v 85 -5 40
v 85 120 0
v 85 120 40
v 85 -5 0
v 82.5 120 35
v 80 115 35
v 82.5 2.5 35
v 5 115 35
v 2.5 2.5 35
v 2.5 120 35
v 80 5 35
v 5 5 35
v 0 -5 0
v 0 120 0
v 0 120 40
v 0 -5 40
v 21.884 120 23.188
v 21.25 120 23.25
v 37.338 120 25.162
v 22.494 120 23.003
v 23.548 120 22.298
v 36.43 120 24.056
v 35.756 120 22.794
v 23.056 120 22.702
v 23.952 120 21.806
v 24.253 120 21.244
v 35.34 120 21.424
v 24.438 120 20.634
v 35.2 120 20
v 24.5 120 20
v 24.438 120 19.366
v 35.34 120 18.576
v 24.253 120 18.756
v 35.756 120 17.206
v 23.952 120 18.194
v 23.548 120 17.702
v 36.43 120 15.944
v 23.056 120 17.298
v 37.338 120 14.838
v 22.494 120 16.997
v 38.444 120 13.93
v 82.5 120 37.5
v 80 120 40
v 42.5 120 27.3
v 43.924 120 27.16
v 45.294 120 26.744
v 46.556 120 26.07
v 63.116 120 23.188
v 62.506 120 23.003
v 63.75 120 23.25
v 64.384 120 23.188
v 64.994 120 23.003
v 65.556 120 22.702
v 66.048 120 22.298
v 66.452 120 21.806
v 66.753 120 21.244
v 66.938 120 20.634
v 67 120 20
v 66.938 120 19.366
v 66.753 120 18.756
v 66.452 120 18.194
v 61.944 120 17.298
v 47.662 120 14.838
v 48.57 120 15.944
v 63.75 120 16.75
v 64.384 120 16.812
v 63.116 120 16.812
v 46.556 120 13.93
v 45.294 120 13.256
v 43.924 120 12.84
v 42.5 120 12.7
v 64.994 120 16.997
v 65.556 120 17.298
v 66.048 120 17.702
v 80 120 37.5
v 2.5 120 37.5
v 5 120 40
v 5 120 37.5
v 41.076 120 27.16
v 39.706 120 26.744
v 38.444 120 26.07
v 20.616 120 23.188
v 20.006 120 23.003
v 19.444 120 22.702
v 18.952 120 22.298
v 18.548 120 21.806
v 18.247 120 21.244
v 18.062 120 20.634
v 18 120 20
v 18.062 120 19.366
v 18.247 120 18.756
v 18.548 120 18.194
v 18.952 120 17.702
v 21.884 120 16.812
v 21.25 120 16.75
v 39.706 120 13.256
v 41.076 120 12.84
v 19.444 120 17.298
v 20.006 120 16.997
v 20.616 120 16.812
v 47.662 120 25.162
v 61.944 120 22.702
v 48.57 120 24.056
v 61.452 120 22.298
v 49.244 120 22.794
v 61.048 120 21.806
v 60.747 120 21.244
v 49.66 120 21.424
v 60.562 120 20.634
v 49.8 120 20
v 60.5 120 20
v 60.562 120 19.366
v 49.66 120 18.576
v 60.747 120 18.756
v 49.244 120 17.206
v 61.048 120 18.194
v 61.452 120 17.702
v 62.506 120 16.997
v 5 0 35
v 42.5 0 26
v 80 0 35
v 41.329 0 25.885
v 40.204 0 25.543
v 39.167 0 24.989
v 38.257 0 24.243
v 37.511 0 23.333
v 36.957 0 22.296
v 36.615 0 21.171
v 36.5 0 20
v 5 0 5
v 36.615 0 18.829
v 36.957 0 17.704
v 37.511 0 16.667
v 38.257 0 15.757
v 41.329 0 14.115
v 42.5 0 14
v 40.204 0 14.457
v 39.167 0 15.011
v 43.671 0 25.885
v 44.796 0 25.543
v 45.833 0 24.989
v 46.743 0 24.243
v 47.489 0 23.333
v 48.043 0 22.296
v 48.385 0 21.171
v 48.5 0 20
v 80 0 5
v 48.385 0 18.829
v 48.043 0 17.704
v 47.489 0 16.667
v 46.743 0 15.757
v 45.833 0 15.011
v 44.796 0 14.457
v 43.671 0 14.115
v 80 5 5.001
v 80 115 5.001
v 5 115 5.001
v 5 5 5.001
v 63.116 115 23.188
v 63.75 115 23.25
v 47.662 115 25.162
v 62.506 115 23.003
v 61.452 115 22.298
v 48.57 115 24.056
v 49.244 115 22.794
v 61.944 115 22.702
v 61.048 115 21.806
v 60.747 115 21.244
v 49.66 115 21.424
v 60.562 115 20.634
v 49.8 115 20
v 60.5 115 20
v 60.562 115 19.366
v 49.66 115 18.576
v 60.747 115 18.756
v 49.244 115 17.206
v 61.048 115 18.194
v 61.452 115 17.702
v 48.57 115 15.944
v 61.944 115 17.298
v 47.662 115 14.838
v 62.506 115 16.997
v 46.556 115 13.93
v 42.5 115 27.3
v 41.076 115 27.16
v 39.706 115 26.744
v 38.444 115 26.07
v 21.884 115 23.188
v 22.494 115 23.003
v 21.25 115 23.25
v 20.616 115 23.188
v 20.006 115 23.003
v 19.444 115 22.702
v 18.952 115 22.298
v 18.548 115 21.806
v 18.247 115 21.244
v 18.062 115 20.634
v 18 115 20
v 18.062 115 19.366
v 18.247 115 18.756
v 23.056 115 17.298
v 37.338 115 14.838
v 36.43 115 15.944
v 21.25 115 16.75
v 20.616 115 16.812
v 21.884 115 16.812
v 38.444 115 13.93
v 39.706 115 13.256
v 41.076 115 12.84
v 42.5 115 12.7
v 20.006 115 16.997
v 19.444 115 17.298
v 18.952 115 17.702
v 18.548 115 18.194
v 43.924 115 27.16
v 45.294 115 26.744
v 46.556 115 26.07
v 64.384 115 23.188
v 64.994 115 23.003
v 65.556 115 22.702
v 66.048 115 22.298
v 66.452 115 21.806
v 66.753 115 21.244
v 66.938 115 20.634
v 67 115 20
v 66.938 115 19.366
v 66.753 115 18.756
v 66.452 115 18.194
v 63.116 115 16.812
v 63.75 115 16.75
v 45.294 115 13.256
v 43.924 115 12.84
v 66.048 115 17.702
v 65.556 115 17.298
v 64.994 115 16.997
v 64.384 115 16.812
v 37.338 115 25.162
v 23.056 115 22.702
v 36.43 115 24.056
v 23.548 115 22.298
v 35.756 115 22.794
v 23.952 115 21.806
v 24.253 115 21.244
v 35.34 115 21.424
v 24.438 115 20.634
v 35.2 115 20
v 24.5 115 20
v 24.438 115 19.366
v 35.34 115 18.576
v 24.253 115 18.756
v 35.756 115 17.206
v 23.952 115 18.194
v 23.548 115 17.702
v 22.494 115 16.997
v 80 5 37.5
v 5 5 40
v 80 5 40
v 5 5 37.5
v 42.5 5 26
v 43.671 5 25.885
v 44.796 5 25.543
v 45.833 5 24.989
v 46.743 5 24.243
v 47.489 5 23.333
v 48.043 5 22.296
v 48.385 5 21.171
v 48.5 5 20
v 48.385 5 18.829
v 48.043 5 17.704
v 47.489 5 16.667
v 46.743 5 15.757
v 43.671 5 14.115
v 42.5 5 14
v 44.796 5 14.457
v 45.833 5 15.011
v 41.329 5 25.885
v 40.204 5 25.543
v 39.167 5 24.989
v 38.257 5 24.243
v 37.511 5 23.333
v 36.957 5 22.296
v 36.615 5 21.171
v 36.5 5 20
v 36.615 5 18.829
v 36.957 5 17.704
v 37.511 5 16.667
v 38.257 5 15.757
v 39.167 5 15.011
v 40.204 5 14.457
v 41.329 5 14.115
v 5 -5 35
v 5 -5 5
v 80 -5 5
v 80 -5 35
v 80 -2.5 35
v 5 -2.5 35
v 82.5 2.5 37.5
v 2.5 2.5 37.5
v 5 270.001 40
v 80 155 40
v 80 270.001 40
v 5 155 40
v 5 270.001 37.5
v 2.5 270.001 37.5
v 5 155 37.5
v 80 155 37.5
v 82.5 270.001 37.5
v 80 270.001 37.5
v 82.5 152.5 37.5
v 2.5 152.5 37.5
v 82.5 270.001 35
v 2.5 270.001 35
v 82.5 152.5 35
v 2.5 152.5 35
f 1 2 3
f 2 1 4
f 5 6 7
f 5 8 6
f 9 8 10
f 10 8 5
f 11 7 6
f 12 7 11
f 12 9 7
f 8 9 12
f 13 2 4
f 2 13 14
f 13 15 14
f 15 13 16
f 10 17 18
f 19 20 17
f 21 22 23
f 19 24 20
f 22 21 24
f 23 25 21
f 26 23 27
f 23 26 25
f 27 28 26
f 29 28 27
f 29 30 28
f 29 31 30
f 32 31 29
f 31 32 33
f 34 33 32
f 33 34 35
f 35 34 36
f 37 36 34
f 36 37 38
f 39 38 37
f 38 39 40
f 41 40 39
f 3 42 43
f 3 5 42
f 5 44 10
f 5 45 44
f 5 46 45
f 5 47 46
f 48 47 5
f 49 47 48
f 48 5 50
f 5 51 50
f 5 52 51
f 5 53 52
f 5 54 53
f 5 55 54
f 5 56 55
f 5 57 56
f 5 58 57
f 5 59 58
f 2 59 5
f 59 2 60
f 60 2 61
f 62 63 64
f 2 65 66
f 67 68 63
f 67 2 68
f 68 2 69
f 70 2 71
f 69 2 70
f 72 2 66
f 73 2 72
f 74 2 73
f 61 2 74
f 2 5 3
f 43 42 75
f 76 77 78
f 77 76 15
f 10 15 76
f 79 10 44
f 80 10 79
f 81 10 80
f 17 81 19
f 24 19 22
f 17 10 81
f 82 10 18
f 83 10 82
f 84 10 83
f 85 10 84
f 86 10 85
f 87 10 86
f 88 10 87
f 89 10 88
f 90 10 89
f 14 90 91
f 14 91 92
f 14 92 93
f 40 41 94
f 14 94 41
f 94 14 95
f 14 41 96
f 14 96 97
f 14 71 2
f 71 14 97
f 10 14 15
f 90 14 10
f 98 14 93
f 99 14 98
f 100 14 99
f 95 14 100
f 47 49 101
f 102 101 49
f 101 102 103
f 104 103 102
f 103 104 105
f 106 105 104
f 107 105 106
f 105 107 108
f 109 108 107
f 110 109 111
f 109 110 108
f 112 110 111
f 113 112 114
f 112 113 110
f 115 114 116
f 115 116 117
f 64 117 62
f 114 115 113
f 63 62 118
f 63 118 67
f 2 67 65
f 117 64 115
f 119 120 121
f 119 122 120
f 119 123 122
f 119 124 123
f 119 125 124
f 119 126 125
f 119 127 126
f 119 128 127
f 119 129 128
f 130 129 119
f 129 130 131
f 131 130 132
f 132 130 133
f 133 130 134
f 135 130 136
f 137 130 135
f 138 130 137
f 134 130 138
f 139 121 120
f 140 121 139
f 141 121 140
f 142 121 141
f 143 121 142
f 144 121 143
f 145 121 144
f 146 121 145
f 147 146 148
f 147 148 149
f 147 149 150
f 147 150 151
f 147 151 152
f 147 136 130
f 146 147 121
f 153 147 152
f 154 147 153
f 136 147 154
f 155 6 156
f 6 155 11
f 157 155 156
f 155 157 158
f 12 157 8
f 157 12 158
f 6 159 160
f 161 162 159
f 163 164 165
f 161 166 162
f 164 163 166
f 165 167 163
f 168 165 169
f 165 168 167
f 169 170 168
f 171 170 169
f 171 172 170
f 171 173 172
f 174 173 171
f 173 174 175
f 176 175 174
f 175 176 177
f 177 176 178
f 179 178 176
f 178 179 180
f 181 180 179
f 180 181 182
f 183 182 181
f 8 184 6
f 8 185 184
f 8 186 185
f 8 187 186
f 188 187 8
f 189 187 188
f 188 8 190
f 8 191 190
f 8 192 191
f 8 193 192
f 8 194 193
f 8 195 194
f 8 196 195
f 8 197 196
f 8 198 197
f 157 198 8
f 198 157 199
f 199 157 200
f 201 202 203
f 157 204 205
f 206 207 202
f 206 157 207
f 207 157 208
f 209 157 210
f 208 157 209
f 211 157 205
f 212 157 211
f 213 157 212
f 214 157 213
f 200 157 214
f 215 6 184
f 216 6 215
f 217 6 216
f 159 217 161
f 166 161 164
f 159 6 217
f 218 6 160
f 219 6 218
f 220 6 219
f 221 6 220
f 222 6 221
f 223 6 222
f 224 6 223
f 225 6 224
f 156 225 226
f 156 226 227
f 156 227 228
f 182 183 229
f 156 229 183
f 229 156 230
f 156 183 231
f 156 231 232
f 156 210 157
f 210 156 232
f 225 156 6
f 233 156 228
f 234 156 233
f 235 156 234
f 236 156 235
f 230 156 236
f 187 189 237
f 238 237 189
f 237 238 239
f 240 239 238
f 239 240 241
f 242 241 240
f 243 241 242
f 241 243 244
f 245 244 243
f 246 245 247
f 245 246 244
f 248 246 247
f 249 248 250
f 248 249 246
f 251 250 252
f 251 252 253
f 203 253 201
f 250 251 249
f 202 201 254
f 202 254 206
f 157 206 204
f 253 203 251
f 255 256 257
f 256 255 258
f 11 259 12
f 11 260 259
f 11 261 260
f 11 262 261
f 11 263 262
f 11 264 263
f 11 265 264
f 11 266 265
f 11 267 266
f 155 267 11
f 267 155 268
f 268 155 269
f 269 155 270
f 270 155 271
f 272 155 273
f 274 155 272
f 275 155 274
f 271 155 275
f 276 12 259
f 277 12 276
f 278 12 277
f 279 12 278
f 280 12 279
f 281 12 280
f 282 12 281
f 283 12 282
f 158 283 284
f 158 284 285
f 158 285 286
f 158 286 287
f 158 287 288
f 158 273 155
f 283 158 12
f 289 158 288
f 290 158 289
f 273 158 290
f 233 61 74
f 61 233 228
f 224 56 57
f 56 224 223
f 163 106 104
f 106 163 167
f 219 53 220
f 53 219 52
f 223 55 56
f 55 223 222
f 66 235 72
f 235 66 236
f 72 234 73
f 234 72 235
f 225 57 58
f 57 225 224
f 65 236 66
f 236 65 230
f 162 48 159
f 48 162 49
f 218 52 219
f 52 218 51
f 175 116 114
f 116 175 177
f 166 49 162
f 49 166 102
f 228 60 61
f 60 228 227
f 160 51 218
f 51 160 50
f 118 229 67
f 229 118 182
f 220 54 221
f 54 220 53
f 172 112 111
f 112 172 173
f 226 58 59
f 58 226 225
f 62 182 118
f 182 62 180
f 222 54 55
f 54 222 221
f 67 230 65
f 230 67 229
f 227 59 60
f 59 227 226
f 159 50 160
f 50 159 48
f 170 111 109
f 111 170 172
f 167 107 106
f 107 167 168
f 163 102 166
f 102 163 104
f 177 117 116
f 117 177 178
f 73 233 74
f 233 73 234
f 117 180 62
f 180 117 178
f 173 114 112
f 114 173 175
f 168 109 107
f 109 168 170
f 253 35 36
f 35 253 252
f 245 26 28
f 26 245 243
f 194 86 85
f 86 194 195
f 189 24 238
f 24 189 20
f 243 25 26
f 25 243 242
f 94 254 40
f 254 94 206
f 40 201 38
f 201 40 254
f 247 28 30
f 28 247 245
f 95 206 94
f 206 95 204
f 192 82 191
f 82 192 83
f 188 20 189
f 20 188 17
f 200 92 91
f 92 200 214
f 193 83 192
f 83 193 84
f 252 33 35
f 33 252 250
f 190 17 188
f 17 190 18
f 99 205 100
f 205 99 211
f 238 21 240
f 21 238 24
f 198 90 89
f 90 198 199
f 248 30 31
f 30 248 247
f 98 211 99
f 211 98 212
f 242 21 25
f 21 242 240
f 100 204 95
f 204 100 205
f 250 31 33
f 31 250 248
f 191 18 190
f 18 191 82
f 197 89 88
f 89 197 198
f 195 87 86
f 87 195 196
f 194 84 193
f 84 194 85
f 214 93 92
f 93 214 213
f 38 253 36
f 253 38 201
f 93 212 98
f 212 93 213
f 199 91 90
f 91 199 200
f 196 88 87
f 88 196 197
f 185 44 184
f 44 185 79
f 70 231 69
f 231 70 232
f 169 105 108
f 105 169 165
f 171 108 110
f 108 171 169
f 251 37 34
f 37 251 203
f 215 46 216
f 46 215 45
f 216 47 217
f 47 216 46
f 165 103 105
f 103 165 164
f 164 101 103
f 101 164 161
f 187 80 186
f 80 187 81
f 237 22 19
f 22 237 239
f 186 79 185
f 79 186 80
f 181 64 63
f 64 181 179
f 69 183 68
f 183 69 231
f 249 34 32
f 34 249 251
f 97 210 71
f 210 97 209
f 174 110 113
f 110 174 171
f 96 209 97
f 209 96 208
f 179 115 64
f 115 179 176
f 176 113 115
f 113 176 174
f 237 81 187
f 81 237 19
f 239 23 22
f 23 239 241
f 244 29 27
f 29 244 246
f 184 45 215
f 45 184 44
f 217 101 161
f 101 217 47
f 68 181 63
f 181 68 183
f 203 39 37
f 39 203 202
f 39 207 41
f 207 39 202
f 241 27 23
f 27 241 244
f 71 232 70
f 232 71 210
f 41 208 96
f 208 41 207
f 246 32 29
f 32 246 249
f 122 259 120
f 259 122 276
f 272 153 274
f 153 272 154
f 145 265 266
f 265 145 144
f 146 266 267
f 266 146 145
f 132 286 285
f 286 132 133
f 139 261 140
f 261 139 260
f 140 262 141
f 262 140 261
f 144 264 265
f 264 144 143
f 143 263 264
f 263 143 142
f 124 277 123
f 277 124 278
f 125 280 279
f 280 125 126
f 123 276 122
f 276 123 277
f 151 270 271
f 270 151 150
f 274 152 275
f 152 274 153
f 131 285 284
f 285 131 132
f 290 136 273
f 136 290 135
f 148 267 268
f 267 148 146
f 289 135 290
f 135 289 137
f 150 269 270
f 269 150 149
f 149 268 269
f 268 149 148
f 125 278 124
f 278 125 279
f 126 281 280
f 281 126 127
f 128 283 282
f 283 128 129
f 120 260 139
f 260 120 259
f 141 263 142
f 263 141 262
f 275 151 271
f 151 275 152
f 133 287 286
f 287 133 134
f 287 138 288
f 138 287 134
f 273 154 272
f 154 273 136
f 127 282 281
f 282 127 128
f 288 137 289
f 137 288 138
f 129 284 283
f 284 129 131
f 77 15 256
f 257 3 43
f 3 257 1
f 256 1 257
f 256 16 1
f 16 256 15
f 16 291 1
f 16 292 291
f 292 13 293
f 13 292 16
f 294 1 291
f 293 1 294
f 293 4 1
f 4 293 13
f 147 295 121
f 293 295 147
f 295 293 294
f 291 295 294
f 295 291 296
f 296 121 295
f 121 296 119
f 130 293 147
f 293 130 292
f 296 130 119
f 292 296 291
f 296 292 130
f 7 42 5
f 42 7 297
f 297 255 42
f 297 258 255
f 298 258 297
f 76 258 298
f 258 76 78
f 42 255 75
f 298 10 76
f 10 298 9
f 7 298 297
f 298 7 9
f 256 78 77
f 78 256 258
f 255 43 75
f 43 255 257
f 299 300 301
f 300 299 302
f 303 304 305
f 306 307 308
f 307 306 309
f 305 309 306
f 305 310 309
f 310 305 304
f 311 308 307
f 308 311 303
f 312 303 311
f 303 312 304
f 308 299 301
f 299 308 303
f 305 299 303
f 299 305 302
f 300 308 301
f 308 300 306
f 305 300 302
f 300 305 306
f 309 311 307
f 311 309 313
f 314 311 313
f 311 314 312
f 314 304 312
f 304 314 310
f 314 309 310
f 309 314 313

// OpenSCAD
// file: hot_insert_support.scad
module hot_insert_support(support_height) {
    cylinder(h=support_height, r=hot_insert_diameter/2, $fn=32);
}
// file: lid.scad
module lid() {
    union() {
        translate([walls_size/2, walls_size/2, inner_h+walls_size])
           cube([base_plate_w-walls_size,base_plate_l-(walls_size/2)+fix_render,walls_size/2]);

        difference() {
            translate([walls_size/2, walls_size/2, inner_h+walls_size+(walls_size/2)])
                cube([base_plate_w-walls_size,base_plate_l-(walls_size/2)+fix_render,(walls_size/2)]);
            //left
            translate([(walls_size/2)-fix_render,walls_size/2,inner_h+walls_size+(walls_size/2)])
                cube([(walls_size/2)+fix_render,base_plate_l,(walls_size/2)+fix_render]);
            //right
             translate([base_plate_w-walls_size,walls_size/2,inner_h+walls_size+(walls_size/2)])
                cube([(walls_size/2)+fix_render,base_plate_l,(walls_size/2)+fix_render]);
            //bottom
            translate([walls_size/2, (walls_size/2)-fix_render, inner_h+walls_size+(walls_size/2)])
                cube([base_plate_w-walls_size,(walls_size/2)+fix_render, (walls_size/2)+fix_render]);
        }
    }
}
// file: bottom_shell.scad
module battery() {
    battery_holder_w = 78;
    battery_holder_l = 21;
    battery_holder_h = 21;
    cube([battery_holder_w,battery_holder_l,2], center=true);
}

// battery();
module bottom_shell() {
    hole_w = base_plate_w - (2 * walls_size);
    hole_l = base_plate_l - (2 * walls_size);

    union() {
        difference() {
            color("green")
                cube([base_plate_w, base_plate_l, inner_h+walls_size]);

            // Square hole in the center
            translate([base_plate_w/2 - hole_w/2, base_plate_l/2 - hole_l/2, walls_size+fix_render])
                cube([hole_w, hole_l, inner_h]);

            // Antenna holes on back wall
            lora_antenna_hole(base_plate_w, base_plate_l, walls_size, inner_h, walls_size);
            gps_antenna_hole(base_plate_w, base_plate_l, walls_size, inner_h, walls_size);

            // USB-C hole on back wall
            usbc_hole(base_plate_w, base_plate_l, walls_size, inner_h, walls_size);

            // Button hole on front wall
            button_hole(base_plate_w, base_plate_l, walls_size, inner_h, walls_size);
        }

        // Protective ridge around button
        color("green")
        button_ridge(base_plate_w, walls_size, inner_h, walls_size);

        // Seal ridge at top for water sealing with top shell
        color("green")
        top_seal_ridge(base_plate_w, base_plate_l, walls_size, inner_h, walls_size);
    }
}

// Reusable circular hole module
module circular_hole(pos, radius, depth, rotation = [0, 0, 0]) {
    translate(pos)
    rotate(rotation)
    cylinder(h = depth, r = radius, center = true, $fn = 32);
}

module lora_antenna_hole(base_w, base_l, base_h, inner_h, walls) {
    circular_hole(
        pos = [3*base_w/4, base_l - walls/2, base_h + inner_h/2],
        radius = sma_radius,
        depth = walls + 2,
        rotation = [90, 0, 0]
    );
}

module gps_antenna_hole(base_w, base_l, base_h, inner_h, walls) {
    circular_hole(
        pos = [base_w/4, base_l - walls/2, base_h + inner_h/2],
        radius = sma_radius,
        depth = walls + 2,
        rotation = [90, 0, 0]
    );
}

module button_hole(base_w, base_l, base_h, inner_h, walls) {
    circular_hole(
        pos = [base_w/2, walls/2, base_h + inner_h/2],
        radius = button_radius,
        depth = walls + 2,
        rotation = [90, 0, 0]
    );
}

module usbc_hole(base_w, base_l, base_h, inner_h, walls) {
    circular_hole(
        pos = [base_w/2, base_l - walls/2, base_h + inner_h/2],
        radius = usbc_radius,
        depth = walls + 2,
        rotation = [90, 0, 0]
    );
}

module button_ridge(base_w, base_h, inner_h, walls) {
    ridge_width = base_w;              // Full width of the shell
    ridge_depth = 10;                  // How far it extends from the wall
    ridge_height = inner_h + (2*walls);    // Full height of the shell

    // Position attached to front wall
    translate([0, -ridge_depth + walls, 0])
    difference() {
        // Outer block
        cube([ridge_width, ridge_depth, ridge_height]);

        // Inner cutout to create U-shape (open toward the front)
        translate([walls, -1, walls])
            cube([ridge_width - (2 * walls), ridge_depth - walls + 1, ridge_height - (2 * walls)]);

        // Button hole through the ridge
        translate([base_w/2, ridge_depth/2, base_h + inner_h/2])
        rotate([90, 0, 0])
            cylinder(h = ridge_depth + 2, r = button_radius, center = true, $fn = 32);

        translate([walls/2,walls+(walls/2),inner_h+walls])
            cube([base_w-walls,(walls/2)+fix_render,walls/2]);
    }
}

module top_seal_ridge(base_w, base_l, base_h, inner_h, walls) {
    rail_height = 5;           // How tall the rail is
    rail_width = walls / 2;    // Width of the rail lip
    rail_clearance = 0.3;      // Clearance for sliding fit
    button_ridge_depth = 10;   // Must match button_ridge ridge_depth

    top_z = base_h + inner_h;  // Z position of top of walls
    rail_start_y = -button_ridge_depth + walls;  // Extend into button ridge area

    // Left rail - L-shaped profile running along Y axis
    translate([0, rail_start_y, top_z])
    difference() {
        // Outer block for left rail
        cube([walls, base_l - rail_start_y, rail_height]);
        // Channel cutout for cover to slide in
        translate([rail_width, -1, -1])
            cube([walls - rail_width + rail_clearance, base_l - rail_start_y + 2, rail_height - rail_width + 1]);
    }

    // Right rail - L-shaped profile running along Y axis
    translate([base_w - walls, rail_start_y, top_z])
    difference() {
        // Outer block for right rail
        cube([walls, base_l - rail_start_y, rail_height]);
        // Channel cutout for cover to slide in
        translate([-rail_clearance, -1, -1])
            cube([walls - rail_width + rail_clearance, base_l - rail_start_y + 2, rail_height - rail_width + 1]);
    }

    // Front stop - prevents cover from sliding out the front (on the button ridge)
    translate([walls, rail_start_y, top_z])
        cube([base_w - (2 * walls), rail_width, rail_height]);
}
// file: config.scad
// Global configuration variables for rugged mesh enclosure

// Enclosure dimensions
walls_size = 5;
base_plate_w = 85;
base_plate_l = 120;
inner_h = 30;

// Rendering fix for boolean operations
fix_render = .001;

// SMA connector hole (6.5mm diameter)
sma_radius = 6.5 / 2;

// Button hole (12mm diameter)
button_radius = 12 / 2;

// USB-C hole (14.6mm diameter)
usbc_radius = 14.6 / 2;

// Hot insert / screw dimensions
screw_length = 14;
hot_insert_length = 5.5;
hot_insert_diameter = 4.5;
support_diameter = hot_insert_diameter + 4;
// main file
// Main assembly file for rugged mesh enclosure
// Open this file in OpenSCAD to render the complete model

include <config.scad>
include <bottom_shell.scad>
include <lid.scad>
include <hot_insert_support.scad>

// Render the bottom shell
bottom_shell();

// Render the lid (offset for visibility)
translate([0, 150, 0])
    lid();
